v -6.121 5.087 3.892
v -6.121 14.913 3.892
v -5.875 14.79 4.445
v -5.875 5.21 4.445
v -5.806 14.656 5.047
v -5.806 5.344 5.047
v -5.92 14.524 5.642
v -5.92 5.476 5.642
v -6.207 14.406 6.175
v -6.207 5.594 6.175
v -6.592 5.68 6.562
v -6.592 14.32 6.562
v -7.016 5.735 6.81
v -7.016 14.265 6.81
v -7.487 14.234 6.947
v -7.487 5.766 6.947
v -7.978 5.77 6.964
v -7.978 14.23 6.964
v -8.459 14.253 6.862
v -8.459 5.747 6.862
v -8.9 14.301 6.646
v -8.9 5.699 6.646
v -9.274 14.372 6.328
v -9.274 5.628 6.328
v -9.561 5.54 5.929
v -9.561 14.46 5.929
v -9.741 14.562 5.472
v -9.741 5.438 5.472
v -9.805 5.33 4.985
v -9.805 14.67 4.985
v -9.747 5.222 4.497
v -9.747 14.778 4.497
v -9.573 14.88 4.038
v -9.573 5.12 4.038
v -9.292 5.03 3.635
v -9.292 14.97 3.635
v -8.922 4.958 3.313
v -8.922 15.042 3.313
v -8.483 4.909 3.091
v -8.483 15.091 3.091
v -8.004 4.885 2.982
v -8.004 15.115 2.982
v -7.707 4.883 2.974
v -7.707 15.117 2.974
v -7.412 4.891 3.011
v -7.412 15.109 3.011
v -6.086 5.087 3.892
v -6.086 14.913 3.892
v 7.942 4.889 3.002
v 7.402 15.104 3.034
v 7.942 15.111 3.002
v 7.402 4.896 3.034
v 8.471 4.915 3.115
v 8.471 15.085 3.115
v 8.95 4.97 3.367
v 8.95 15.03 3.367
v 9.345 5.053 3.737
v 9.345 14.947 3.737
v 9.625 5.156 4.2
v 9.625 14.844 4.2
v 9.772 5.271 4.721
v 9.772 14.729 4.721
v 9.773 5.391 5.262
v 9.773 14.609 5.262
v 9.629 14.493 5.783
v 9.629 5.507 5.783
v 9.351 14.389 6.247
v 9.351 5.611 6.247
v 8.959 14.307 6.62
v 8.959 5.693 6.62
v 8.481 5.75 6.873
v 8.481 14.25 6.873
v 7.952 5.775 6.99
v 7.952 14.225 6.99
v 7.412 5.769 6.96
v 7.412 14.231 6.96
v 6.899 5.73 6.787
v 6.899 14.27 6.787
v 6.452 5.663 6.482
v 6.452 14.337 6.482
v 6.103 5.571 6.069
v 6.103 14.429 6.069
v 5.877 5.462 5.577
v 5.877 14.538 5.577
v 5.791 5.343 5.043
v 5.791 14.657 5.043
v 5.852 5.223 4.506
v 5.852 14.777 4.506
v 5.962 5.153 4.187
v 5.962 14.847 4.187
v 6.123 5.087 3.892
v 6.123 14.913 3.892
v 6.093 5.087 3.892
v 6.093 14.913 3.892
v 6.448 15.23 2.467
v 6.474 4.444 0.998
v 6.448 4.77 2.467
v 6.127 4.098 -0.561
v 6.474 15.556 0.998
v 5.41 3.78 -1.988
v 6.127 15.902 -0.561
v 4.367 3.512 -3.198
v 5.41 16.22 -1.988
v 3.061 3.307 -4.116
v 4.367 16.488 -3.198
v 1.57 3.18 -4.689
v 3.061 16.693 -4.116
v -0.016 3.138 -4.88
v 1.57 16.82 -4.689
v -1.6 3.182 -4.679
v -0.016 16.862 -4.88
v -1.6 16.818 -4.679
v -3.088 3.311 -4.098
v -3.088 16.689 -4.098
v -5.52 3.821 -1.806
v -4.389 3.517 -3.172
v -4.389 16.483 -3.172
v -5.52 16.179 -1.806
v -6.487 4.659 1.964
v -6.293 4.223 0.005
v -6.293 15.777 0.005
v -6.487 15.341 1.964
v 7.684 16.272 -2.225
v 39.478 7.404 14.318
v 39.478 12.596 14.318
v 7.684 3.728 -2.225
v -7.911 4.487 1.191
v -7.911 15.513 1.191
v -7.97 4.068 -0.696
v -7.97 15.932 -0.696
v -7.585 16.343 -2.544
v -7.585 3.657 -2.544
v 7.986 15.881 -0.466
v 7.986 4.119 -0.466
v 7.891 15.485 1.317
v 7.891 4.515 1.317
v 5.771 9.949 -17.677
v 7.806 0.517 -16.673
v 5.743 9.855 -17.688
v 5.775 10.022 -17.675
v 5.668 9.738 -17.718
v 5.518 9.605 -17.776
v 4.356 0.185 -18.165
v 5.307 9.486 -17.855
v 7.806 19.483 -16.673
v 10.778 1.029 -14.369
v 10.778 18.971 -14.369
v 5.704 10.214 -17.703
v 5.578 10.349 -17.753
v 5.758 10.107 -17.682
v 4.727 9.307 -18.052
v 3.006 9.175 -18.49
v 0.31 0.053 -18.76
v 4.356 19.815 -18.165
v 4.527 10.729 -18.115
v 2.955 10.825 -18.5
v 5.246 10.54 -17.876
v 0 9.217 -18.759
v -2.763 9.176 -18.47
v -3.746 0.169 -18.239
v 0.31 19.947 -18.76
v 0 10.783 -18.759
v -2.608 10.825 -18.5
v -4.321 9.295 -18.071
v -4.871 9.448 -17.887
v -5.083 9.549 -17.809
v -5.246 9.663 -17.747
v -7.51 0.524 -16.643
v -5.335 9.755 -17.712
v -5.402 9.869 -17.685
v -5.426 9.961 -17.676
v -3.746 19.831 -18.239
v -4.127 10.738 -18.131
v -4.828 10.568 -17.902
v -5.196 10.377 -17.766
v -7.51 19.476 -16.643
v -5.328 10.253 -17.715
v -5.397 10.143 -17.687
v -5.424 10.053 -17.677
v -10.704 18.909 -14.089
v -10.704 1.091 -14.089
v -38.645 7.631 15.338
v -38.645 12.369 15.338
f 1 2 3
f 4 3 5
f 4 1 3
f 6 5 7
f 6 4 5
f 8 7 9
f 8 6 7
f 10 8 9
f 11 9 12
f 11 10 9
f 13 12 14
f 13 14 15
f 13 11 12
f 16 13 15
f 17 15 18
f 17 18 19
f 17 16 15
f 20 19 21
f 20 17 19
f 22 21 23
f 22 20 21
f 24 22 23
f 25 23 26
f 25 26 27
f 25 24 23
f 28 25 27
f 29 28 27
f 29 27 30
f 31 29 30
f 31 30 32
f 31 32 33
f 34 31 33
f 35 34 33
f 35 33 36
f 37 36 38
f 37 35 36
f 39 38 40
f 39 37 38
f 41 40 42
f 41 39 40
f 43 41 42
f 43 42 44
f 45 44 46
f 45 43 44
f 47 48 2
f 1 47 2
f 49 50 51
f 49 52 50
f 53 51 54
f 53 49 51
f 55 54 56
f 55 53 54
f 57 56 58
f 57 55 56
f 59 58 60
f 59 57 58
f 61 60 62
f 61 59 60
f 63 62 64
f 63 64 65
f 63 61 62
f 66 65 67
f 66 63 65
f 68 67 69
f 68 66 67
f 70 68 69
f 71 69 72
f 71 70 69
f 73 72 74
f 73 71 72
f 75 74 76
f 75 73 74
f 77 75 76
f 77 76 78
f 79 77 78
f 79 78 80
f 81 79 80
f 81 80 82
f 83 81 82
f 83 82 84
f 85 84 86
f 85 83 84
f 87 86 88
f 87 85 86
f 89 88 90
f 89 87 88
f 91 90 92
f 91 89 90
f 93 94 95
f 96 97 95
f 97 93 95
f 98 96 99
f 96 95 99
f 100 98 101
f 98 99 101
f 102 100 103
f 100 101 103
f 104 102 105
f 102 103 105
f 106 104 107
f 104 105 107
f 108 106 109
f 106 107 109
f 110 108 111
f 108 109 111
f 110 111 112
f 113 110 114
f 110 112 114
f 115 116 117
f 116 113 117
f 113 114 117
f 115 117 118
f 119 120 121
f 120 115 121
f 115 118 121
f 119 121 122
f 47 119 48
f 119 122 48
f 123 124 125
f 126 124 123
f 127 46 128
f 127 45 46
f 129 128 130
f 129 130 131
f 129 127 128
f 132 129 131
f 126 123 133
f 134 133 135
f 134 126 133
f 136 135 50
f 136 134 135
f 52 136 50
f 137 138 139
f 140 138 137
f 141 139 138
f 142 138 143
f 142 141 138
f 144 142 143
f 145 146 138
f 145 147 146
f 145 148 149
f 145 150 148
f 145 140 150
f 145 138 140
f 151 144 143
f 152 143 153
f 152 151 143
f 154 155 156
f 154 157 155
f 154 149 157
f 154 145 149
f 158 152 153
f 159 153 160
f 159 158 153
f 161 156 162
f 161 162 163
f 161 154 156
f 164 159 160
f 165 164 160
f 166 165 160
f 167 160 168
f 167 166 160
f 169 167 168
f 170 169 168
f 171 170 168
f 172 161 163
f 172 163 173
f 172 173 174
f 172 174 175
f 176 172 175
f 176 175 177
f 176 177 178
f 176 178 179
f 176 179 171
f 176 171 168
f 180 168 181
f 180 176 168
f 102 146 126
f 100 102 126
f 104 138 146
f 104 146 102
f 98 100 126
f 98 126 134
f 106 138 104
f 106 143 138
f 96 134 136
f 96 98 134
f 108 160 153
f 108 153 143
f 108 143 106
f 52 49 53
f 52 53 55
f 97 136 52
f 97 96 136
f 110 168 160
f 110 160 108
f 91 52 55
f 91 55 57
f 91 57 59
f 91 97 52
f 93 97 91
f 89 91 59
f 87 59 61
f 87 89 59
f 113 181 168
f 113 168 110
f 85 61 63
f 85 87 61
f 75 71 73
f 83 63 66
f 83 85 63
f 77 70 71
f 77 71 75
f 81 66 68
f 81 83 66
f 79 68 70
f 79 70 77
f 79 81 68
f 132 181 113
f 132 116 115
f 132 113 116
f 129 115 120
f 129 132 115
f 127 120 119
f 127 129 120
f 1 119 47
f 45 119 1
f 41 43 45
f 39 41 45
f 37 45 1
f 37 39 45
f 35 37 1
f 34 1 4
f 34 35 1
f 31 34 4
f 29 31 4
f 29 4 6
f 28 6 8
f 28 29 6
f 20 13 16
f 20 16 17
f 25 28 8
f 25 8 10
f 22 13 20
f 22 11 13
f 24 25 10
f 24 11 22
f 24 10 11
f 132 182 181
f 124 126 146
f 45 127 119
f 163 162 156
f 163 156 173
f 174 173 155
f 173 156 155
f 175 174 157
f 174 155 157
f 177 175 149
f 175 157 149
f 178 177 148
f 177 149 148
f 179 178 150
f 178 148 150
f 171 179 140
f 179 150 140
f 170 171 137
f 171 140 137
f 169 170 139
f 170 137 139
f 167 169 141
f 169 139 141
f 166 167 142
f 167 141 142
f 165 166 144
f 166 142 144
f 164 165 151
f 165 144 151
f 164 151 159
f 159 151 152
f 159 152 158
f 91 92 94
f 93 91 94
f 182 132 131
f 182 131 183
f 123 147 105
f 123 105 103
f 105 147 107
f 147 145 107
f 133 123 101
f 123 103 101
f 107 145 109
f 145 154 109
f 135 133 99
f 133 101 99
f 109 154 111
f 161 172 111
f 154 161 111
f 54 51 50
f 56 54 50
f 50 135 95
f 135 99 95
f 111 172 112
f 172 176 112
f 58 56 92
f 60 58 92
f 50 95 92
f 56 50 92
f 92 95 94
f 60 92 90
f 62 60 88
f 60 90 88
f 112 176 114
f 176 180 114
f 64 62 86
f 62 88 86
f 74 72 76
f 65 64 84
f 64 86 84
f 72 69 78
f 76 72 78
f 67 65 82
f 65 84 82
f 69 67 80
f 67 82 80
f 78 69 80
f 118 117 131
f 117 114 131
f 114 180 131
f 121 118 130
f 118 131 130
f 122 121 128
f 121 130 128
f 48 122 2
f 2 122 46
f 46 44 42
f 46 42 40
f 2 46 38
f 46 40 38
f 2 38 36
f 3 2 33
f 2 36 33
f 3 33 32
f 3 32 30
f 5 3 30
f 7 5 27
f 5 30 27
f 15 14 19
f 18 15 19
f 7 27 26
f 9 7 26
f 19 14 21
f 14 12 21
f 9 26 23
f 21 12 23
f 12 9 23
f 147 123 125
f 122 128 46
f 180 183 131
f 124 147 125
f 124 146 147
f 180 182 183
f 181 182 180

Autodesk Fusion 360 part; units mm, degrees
sketch "main body" plane through (0, 0, 0) normal (0, 1, 0) x (1, 0, 0) in component "main"
  arc A0 (-7.5849, 2.5435) -> (7.6843, 2.225) centre (0, 0) ccw
  line L0 (-7.5849, 2.5435) -> (-38.6454, -15.3377)
  line L1 (-38.6454, -15.3377) -> (-0.1069, 25.2491)
  line L2 (-0.1069, 25.2491) -> (39.4777, -14.3181)
  line L3 (39.4777, -14.3181) -> (7.6843, 2.225)
  dimension "d1" = 8
extrude "Extrude1" add sketch "main body" along normal blind 20 in component "main"
fillet "Fillet1" radius 15 1 edges at (-0.1069, 10, -25.2491) in component "main"
sketch "main hole" plane through (0, 20, 0) normal (0, 1, 0) x (-1, 0, 0) in component "main"
  arc A0 (-10.7778, -14.3691) -> (10.704, -14.0888) centre (-0.1736, -3.7602) ccw
  line L0 (10.704, -14.0888) -> (38.6454, 15.3377)
  line L1 (38.6454, 15.3377) -> (7.5849, -2.5435)
  line L2 (-7.6843, -2.225) -> (-39.4777, 14.3181)
  line L3 (-39.4777, 14.3181) -> (-10.7778, -14.3691)
  circle A1 centre (-0.0035, 1.6197) radius 6.5
  line L4 (-10.0035, 3.8921) -> (9.9387, 3.8921)
  line L5 (9.9387, 3.8921) -> (9.9387, 20.1413)
  line L6 (9.9387, 20.1413) -> (-10.0035, 20.1413)
  line L7 (-10.0035, 20.1413) -> (-10.0035, 3.8921)
  line L8 (-10.0035, 3.8921) -> (9.9387, 20.1413) construction
  line L9 (9.9387, 3.8921) -> (-10.0035, 20.1413) construction
  dimension "d5" = 13
extrude "Extrude5" cut sketch "main hole" against normal blind 20 in component "main"
extrude "Extrude3" cut sketch "main hole" against normal blind 20 contours A1 L4 | A1 L4 in component "main"
sketch "rounded borders" plane through (0, 0, 0) normal (0, 1, 0) x (1, 0, 0) in component "main"
  circle A0 centre (-7.8046, -4.9719) radius 2
  circle A1 centre (7.7907, -4.9961) radius 2
  dimension "d16" = 4
  dimension "d17" = 4
extrude "Extrude6" add sketch "rounded borders" along normal blind 20 in component "main"
sketch "cut sides" plane through (0, 0, 0) normal (1, 0, 0) x (0, 0, -1) in component "main"
  line L0 (28, 22) -> (-17, 12)
  line L1 (-15.3377, 0) -> (-15.3377, 20)
  line L2 (-17, 12) -> (-17, 22)
  line L3 (-17, 22) -> (28, 22)
  line L4 (28, -2) -> (-17, 8)
  line L5 (-17, 8) -> (-17, -2)
  line L6 (-17, -2) -> (28, -2)
extrude "Extrude7" cut sketch "cut sides" along normal mid plane 100 in component "main"
sketch "Sketch9" plane through (0, 0, 0) normal (1, 0, 0) x (0, 1, 0) in component "main"
  circle A0 centre (10, -18.5) radius 0.825
  dimension "d22" = 1.65
extrude "Extrude8" cut sketch "Sketch9" along normal mid plane 40 in component "main"
component "main" placed x (1, 0, 0) y (0, 1, 0) z (0, 0, 1) at (0, 0, 0)
properties part number "rampClip"
